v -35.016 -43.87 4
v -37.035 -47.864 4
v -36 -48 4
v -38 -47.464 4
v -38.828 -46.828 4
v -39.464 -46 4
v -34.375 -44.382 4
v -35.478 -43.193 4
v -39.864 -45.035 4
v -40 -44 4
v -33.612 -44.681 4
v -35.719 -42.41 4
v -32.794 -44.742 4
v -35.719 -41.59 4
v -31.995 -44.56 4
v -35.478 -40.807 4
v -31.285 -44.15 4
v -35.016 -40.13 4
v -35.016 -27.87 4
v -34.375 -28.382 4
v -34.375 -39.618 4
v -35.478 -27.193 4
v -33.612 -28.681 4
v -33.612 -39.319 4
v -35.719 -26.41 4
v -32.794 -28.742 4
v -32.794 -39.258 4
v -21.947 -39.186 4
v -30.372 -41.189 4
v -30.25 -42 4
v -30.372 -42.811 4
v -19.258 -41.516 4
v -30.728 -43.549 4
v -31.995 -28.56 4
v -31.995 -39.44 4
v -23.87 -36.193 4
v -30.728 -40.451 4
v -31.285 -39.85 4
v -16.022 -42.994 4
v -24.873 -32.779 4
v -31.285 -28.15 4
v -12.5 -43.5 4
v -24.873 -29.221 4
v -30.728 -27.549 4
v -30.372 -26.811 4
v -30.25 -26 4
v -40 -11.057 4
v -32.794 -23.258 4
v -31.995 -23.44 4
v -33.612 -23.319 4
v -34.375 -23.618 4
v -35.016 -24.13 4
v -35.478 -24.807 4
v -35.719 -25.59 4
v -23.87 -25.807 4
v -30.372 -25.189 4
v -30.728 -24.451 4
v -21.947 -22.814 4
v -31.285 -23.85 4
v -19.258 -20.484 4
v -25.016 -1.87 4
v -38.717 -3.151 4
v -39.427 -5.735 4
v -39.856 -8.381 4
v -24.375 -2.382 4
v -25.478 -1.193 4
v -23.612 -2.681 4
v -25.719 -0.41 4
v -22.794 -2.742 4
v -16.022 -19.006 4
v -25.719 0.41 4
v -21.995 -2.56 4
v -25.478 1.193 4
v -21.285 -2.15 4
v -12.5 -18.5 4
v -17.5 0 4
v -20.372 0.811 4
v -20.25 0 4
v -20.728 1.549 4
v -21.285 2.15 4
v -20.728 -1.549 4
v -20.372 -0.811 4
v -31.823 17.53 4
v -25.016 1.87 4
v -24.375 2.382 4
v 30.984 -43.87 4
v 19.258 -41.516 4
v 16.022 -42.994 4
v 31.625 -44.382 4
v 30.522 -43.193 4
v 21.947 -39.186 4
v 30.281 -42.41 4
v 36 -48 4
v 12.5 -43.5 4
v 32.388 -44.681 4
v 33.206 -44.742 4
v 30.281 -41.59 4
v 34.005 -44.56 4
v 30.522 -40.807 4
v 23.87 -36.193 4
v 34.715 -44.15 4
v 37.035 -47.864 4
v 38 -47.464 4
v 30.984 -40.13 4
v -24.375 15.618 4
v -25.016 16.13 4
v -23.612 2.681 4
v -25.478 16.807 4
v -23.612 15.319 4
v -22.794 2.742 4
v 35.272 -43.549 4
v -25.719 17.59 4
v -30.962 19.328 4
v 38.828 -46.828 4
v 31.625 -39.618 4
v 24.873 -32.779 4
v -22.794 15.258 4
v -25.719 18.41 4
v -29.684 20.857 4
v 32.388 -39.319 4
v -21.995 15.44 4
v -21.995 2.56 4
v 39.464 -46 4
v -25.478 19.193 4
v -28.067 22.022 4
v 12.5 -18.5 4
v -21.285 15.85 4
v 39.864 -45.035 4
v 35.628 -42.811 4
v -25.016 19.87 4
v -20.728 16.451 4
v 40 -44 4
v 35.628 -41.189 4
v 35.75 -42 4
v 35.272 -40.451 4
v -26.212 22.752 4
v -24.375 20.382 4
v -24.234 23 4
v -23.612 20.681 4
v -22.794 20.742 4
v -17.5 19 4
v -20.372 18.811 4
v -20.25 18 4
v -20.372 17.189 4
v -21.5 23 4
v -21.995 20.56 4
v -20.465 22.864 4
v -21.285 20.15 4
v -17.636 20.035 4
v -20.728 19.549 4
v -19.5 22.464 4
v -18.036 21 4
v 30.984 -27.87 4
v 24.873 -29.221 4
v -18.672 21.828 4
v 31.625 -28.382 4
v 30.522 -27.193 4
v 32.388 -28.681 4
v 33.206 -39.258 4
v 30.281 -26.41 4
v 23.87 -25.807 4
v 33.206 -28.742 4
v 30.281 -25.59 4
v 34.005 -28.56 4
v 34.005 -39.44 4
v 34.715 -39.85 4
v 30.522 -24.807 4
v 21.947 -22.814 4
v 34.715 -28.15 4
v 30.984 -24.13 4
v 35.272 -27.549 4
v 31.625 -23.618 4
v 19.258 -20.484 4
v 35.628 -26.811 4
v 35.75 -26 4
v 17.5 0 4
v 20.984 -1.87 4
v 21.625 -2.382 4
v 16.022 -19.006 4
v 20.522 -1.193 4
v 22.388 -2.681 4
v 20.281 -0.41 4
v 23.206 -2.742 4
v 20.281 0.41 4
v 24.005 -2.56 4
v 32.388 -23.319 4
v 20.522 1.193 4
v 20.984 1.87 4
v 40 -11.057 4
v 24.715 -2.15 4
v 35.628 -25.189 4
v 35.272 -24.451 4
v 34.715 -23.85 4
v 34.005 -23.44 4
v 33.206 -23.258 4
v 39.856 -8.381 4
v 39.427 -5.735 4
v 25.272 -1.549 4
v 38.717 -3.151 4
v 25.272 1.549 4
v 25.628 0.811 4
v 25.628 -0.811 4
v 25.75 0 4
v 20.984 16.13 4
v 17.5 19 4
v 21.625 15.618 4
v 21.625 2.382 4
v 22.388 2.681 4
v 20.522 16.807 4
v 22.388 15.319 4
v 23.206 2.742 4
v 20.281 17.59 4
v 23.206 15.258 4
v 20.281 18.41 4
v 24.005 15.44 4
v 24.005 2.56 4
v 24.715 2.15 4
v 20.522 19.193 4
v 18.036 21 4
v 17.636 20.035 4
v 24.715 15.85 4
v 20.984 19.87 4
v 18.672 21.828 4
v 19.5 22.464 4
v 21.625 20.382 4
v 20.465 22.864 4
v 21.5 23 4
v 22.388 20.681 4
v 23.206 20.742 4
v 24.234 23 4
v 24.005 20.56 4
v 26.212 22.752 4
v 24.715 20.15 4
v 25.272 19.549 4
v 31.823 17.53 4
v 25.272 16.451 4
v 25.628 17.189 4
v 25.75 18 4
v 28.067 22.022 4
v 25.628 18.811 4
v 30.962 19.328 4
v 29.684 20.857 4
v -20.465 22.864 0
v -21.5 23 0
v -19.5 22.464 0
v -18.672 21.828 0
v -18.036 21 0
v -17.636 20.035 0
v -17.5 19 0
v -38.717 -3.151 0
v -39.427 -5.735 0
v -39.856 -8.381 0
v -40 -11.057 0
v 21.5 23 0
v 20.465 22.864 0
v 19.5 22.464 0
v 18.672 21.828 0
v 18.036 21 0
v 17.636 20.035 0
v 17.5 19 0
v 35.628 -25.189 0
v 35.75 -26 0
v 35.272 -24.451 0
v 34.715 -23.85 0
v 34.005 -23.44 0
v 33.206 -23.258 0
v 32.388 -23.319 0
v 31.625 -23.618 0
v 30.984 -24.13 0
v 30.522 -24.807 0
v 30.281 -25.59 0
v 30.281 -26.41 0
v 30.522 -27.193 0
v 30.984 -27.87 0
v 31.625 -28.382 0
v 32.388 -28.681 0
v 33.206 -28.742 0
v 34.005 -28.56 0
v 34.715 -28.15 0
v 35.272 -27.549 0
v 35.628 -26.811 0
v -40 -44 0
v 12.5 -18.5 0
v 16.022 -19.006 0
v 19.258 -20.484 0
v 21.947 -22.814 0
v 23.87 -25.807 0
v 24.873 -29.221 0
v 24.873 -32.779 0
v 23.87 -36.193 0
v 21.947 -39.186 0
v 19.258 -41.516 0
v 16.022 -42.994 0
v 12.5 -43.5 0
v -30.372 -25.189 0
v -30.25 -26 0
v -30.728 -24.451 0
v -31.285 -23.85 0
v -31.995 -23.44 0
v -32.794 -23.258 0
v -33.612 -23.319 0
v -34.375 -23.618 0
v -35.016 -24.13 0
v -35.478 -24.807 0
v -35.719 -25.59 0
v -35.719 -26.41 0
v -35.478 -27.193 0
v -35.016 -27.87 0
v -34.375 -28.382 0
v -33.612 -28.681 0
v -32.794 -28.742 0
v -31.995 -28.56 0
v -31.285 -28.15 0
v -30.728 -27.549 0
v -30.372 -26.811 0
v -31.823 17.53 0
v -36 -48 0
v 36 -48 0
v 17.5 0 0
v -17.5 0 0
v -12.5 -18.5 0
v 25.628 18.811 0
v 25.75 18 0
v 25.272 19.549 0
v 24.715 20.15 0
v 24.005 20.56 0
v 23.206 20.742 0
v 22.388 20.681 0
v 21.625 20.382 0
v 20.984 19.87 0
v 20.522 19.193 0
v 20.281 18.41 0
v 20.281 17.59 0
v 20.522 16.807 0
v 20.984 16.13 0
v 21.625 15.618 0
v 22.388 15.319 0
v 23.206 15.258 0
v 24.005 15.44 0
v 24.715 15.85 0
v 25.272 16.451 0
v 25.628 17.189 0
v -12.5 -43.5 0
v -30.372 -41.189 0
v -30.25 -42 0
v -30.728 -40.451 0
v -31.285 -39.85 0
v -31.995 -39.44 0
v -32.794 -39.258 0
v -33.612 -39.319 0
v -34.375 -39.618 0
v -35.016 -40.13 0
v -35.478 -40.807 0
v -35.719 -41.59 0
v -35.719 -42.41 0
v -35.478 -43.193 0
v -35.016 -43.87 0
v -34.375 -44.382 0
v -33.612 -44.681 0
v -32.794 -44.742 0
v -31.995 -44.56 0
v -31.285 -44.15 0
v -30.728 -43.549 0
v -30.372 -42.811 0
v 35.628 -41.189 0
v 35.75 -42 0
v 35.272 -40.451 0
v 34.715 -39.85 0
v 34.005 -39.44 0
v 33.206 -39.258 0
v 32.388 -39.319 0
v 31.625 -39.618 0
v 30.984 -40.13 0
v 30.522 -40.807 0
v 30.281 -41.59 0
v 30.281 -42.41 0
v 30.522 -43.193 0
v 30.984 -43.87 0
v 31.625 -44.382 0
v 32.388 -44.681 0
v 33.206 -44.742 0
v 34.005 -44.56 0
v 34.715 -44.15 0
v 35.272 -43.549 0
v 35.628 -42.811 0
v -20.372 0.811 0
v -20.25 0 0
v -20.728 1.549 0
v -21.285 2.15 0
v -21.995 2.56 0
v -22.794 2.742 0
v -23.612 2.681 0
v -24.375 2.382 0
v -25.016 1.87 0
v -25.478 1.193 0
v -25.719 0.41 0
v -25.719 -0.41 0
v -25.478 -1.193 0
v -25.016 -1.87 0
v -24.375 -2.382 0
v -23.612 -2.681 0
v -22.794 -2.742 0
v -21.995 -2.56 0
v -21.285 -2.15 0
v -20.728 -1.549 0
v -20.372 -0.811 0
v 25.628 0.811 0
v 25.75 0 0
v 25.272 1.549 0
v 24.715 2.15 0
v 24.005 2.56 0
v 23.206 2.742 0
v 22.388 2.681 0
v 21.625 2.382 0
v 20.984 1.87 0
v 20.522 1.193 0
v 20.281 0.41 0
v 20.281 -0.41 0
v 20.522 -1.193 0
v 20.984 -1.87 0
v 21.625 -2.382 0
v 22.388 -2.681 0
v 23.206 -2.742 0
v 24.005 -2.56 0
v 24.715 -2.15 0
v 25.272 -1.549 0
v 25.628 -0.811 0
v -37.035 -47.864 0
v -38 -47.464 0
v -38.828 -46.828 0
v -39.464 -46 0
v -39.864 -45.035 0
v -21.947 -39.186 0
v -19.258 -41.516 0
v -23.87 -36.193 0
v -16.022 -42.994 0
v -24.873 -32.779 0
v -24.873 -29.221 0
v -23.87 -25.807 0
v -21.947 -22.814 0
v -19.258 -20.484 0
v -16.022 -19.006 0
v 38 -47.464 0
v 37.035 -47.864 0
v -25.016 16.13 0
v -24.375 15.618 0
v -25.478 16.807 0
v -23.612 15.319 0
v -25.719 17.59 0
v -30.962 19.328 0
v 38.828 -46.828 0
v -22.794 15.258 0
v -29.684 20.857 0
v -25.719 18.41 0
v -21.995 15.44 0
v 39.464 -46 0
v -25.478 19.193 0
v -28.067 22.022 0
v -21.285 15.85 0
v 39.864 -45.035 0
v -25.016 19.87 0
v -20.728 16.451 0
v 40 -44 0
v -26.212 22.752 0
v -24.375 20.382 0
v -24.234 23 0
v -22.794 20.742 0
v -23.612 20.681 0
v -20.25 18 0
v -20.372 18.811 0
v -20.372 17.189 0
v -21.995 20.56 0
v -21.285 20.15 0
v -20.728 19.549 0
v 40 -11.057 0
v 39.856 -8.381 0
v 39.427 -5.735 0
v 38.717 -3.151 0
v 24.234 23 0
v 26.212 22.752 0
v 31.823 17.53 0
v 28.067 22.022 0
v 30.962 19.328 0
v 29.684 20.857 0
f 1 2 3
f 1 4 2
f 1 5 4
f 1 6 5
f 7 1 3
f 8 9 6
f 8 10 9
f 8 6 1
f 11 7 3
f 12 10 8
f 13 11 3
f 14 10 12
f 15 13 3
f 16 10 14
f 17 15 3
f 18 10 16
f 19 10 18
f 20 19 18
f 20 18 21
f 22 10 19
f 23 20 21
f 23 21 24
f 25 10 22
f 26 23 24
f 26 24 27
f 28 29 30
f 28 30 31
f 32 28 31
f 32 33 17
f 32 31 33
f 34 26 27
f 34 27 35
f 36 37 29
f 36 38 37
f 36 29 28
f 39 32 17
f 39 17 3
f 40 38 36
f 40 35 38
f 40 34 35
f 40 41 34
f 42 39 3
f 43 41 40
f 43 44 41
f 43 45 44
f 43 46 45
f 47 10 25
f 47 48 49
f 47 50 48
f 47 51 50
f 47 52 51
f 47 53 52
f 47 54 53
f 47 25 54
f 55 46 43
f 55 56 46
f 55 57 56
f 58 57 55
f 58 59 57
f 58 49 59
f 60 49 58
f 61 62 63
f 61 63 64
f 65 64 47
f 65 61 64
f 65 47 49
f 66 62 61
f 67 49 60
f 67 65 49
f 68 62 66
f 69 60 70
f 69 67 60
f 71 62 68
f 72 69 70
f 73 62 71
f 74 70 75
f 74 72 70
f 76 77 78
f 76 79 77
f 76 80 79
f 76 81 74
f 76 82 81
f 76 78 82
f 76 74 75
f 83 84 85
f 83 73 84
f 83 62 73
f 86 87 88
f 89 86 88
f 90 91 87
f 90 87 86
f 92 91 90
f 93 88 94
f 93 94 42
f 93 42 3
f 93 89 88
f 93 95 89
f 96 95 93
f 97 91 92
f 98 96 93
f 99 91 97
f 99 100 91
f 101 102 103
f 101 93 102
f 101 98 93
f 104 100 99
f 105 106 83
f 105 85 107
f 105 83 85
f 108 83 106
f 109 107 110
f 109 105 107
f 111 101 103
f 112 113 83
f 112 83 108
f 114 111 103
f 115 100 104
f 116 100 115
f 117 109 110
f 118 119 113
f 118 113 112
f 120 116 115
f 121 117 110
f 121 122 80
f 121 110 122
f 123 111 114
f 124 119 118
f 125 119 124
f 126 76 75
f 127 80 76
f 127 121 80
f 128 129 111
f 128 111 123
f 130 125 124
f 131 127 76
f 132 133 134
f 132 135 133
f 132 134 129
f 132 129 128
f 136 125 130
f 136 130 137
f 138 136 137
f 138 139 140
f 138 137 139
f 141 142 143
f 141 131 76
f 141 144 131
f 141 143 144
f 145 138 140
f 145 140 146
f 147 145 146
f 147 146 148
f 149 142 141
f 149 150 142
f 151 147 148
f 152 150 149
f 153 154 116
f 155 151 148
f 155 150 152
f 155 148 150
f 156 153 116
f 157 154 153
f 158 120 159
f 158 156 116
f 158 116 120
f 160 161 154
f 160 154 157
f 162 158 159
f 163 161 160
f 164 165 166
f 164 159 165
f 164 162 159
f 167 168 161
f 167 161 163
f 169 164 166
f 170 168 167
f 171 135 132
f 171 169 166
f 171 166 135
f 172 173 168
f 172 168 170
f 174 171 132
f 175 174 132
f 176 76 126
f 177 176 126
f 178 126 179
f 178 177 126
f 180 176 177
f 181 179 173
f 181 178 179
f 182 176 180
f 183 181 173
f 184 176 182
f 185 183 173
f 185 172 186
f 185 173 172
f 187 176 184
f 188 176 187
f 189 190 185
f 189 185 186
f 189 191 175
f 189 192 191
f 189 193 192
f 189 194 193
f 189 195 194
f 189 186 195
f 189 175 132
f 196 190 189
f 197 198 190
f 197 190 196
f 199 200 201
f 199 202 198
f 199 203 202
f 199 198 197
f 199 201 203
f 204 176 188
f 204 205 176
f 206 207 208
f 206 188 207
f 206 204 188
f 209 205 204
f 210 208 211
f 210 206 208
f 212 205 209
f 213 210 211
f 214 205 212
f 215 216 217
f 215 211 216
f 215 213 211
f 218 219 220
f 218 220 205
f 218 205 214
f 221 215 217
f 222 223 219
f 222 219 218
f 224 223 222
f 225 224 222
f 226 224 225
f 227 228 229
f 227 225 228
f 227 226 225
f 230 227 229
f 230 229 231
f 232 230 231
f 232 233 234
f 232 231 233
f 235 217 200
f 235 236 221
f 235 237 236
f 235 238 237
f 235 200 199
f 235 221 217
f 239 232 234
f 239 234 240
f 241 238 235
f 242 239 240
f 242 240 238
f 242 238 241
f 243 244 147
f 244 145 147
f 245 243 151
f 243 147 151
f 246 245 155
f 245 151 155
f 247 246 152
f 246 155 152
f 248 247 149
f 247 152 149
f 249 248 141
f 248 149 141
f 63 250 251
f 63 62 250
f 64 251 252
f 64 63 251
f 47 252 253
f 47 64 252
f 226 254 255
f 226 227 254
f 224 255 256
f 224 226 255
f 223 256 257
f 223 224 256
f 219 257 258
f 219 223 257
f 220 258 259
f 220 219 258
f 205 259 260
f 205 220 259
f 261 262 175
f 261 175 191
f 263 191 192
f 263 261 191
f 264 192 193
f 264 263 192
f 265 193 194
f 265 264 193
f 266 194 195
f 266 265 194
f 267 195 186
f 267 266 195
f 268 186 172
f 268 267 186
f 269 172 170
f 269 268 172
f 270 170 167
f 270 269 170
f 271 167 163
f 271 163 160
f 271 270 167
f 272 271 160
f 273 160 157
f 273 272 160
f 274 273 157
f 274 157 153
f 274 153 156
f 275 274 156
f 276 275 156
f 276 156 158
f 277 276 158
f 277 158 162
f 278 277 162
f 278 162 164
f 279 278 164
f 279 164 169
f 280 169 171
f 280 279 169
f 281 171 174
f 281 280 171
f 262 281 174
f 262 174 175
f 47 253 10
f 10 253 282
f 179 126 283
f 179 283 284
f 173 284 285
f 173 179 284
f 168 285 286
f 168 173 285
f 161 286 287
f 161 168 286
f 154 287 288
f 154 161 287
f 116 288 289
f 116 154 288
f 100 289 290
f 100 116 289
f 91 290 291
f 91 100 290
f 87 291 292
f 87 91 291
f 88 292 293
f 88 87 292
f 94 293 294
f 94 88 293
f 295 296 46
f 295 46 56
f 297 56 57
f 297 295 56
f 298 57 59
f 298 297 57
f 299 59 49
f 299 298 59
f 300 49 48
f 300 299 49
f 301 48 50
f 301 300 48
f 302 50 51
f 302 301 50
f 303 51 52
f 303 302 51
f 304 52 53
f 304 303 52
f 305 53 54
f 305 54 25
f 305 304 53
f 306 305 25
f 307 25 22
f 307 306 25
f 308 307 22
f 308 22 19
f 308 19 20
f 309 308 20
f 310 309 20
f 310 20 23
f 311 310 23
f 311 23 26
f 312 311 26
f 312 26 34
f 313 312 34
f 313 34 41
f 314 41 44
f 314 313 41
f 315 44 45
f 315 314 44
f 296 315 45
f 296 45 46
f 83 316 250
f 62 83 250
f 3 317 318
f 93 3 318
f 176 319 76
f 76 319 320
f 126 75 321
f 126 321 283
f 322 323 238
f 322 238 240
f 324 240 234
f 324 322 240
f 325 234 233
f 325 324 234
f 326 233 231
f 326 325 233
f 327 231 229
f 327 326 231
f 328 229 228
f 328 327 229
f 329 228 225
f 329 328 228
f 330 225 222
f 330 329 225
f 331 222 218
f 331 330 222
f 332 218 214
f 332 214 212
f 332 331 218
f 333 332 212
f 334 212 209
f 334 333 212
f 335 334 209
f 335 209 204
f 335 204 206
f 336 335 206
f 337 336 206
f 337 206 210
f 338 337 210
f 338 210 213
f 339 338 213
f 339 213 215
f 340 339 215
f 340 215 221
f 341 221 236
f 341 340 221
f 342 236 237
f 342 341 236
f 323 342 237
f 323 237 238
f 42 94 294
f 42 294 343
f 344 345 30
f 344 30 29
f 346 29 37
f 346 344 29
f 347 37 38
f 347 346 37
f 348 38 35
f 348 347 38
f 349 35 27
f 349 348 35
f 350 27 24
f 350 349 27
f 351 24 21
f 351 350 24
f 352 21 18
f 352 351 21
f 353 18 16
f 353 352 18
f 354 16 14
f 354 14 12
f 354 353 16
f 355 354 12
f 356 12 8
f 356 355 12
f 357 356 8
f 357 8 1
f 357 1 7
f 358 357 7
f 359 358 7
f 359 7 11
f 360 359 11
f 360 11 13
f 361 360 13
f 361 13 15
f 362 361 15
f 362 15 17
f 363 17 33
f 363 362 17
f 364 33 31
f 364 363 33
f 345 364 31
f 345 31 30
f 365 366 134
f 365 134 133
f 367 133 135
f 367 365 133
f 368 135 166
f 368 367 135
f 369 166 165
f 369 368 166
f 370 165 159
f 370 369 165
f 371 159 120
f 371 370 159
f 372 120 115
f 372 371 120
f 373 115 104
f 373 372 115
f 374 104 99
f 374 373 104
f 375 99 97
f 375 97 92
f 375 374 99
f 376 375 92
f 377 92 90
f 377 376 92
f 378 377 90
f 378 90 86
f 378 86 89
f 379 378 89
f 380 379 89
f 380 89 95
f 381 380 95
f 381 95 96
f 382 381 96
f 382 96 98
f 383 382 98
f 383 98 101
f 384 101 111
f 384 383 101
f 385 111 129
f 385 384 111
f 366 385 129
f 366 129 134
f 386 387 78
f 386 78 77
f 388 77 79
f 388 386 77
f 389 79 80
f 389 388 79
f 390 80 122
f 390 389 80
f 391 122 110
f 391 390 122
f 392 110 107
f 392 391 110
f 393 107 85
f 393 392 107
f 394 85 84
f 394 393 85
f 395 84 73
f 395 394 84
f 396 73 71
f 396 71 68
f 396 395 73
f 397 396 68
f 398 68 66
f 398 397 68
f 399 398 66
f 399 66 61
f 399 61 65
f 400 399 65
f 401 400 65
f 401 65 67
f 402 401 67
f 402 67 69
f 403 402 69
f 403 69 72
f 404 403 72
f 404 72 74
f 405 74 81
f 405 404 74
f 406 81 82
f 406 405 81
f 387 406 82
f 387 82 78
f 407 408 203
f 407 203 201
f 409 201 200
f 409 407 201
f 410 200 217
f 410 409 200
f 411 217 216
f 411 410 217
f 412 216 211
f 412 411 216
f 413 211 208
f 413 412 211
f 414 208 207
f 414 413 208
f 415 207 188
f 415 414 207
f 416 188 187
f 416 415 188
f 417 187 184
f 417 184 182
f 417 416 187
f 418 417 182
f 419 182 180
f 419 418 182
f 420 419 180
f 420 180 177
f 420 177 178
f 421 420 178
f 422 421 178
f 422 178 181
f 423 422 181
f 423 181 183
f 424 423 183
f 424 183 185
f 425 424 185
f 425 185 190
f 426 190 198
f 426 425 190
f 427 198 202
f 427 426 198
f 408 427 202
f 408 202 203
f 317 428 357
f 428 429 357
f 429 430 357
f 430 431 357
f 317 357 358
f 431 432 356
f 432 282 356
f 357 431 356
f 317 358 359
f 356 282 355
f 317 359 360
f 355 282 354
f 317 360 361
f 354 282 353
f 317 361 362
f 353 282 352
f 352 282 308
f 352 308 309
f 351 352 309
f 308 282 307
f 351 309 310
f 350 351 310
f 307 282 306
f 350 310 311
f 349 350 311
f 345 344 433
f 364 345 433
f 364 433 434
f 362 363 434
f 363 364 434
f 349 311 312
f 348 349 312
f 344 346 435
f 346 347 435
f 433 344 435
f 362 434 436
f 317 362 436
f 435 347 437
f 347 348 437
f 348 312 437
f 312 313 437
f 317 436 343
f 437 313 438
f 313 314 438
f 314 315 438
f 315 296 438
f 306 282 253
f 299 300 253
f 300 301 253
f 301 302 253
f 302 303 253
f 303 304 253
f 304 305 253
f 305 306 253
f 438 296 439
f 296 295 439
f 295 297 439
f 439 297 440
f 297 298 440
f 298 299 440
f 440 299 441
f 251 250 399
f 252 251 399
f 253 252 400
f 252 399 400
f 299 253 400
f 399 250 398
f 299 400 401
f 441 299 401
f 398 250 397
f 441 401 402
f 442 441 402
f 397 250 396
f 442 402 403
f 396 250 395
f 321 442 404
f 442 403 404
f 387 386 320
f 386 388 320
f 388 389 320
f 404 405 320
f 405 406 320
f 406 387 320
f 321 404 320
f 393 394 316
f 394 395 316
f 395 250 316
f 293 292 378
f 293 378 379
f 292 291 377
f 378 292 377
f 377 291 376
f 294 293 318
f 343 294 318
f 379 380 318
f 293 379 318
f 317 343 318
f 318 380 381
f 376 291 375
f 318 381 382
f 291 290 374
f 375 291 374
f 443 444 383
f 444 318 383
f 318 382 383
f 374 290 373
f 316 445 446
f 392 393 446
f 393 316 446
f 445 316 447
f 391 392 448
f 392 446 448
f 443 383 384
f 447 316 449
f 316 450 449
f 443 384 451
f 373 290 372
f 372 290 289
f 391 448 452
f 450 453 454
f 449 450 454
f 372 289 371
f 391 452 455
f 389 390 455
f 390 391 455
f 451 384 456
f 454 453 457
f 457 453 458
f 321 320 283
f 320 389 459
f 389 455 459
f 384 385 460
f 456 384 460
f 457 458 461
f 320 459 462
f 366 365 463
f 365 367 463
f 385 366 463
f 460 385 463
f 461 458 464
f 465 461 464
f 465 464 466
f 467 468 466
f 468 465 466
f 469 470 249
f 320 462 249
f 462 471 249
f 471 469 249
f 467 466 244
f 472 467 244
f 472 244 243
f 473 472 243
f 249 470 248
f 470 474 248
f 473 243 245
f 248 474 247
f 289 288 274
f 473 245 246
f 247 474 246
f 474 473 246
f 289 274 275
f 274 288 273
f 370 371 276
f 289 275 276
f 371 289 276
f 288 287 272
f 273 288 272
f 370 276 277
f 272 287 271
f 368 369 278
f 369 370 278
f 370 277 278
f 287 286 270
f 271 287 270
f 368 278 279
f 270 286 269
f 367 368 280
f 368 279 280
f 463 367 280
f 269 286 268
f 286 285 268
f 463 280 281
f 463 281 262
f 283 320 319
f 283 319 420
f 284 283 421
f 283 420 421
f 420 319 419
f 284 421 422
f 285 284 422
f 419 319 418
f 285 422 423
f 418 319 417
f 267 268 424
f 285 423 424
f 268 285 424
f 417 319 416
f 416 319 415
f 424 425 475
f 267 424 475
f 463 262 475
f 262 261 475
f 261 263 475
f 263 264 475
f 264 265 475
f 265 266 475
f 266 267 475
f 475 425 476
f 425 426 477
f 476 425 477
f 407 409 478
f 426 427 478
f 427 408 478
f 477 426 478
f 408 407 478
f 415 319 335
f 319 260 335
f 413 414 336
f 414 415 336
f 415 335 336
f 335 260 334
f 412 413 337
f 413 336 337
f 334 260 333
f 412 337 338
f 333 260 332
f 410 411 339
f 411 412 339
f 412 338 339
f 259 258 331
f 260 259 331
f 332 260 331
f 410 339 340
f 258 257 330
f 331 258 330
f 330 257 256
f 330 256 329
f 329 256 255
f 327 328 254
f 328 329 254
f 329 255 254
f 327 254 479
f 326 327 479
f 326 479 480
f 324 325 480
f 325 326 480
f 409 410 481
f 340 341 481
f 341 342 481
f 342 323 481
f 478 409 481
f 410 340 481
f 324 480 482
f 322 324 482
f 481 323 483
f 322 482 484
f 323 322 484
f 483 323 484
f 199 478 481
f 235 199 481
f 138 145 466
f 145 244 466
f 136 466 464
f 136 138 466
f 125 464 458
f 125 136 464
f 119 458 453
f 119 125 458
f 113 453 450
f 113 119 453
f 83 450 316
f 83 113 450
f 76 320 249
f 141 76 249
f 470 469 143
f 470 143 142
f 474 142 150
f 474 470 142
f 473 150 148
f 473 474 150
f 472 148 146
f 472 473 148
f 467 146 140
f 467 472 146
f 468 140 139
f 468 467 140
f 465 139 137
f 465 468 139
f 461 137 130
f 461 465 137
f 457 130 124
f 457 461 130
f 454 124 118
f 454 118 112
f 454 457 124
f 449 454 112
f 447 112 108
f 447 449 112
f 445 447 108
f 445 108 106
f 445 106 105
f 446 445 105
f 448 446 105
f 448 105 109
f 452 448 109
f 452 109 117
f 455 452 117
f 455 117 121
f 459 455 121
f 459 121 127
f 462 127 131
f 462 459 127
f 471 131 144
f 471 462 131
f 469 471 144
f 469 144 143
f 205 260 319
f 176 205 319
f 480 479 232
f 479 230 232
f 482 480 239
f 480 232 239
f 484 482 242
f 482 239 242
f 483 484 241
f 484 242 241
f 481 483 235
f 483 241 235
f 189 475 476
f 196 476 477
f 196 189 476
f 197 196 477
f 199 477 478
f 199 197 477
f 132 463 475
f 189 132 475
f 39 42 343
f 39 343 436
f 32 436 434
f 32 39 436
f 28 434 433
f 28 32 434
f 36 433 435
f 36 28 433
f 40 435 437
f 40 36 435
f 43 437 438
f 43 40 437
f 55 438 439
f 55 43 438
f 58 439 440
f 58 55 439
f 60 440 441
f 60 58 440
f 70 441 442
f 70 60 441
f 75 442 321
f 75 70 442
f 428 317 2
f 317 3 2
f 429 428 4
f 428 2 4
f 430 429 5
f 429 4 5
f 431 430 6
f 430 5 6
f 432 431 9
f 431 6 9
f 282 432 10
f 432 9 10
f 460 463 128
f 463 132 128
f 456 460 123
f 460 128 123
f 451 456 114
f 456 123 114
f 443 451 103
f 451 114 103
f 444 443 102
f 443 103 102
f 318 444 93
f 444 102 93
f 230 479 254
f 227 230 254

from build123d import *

# Parameters (mm, degrees)
SKETCH_1_R          = 2.75
EXTRUDE_1_DEPTH     = 4
SKETCH_2_R          = 2.75
EXTRUDE_2_DEPTH     = 4
FILLET_2_R          = 4
FILLET_3_R          = 8
FILLET_4_R          = 25
CUT_EXTRUDE_1_DEPTH = 5


with BuildPart() as part:
    # Эскиз1 → Бобышка-Вытянуть1 (new body)
    with BuildSketch(Plane.XY):
        Polygon((18, 0), (-18, 0), (-18, 23), (-30, 23), (-30, -7), (-40, -7), (-40, -32), (40, -32), (40, -7), (30, -7), (30, 23), (18, 23), align=None)
        with Locations((-23, 18)):
            Circle(SKETCH_1_R, mode=Mode.SUBTRACT)
        with Locations((-23, 0)):
            Circle(SKETCH_1_R, mode=Mode.SUBTRACT)
        with Locations((-33, -26)):
            Circle(SKETCH_1_R, mode=Mode.SUBTRACT)
        with Locations((0, -26)):
            Circle(SKETCH_1_R, mode=Mode.SUBTRACT)
        with Locations((33, -26)):
            Circle(SKETCH_1_R, mode=Mode.SUBTRACT)
        with Locations((23, 18)):
            Circle(SKETCH_1_R, mode=Mode.SUBTRACT)
        with Locations((23, 0)):
            Circle(SKETCH_1_R, mode=Mode.SUBTRACT)
    extrude(amount=EXTRUDE_1_DEPTH)

    # Эскиз2 → Бобышка-Вытянуть2 (add)
    with BuildSketch(Plane.XY):
        Polygon((17.5, 0), (-17.5, 0), (-17.5, 23), (-30, 23), (-40, -7), (-40, -32), (-40, -48), (40, -48), (40, -32), (40, -7), (30, 23), (17.5, 23), align=None)
        with Locations((-23, 18)):
            Circle(SKETCH_2_R, mode=Mode.SUBTRACT)
        with Locations((-23, 0)):
            Circle(SKETCH_2_R, mode=Mode.SUBTRACT)
        with Locations((-33, -26)):
            Circle(SKETCH_2_R, mode=Mode.SUBTRACT)
        with Locations((-33, -42)):
            Circle(SKETCH_2_R, mode=Mode.SUBTRACT)
        with Locations((33, -26)):
            Circle(SKETCH_2_R, mode=Mode.SUBTRACT)
        with Locations((23, 18)):
            Circle(SKETCH_2_R, mode=Mode.SUBTRACT)
        with Locations((23, 0)):
            Circle(SKETCH_2_R, mode=Mode.SUBTRACT)
        with Locations((33, -42)):
            Circle(SKETCH_2_R, mode=Mode.SUBTRACT)
    extrude(amount=EXTRUDE_2_DEPTH)

    # Скругление2
    fillet_2_edges = [part.edges().sort_by_distance(p)[0] for p in [
        (-17.5, 23, 2),
        (40, -48, 2),
        (-40, -48, 2),
        (17.5, 23, 2),
    ]]
    fillet(fillet_2_edges, radius=FILLET_2_R)

    # Скругление3
    fillet_3_edges = [part.edges().sort_by_distance(p)[0] for p in [
        (30, 23, 2),
        (-30, 23, 2),
    ]]
    fillet(fillet_3_edges, radius=FILLET_3_R)

    # Скругление4
    fillet_4_edges = [part.edges().sort_by_distance(p)[0] for p in [
        (40, -7, 2),
        (-40, -7, 2),
    ]]
    fillet(fillet_4_edges, radius=FILLET_4_R)

    # Эскиз3 → Вырез-Вытянуть1 (cut, through all)
    with BuildSketch(Plane.XY.offset(4)):
        with BuildLine():
            Line((-12.5, -18.5), (12.5, -18.5))
            ThreePointArc((12.5, -18.5), (25, -31), (12.5, -43.5))
            Line((12.5, -43.5), (-12.5, -43.5))
            ThreePointArc((-12.5, -43.5), (-25, -31), (-12.5, -18.5))
        make_face()
    extrude(amount=-CUT_EXTRUDE_1_DEPTH, mode=Mode.SUBTRACT)


solid = part.part
